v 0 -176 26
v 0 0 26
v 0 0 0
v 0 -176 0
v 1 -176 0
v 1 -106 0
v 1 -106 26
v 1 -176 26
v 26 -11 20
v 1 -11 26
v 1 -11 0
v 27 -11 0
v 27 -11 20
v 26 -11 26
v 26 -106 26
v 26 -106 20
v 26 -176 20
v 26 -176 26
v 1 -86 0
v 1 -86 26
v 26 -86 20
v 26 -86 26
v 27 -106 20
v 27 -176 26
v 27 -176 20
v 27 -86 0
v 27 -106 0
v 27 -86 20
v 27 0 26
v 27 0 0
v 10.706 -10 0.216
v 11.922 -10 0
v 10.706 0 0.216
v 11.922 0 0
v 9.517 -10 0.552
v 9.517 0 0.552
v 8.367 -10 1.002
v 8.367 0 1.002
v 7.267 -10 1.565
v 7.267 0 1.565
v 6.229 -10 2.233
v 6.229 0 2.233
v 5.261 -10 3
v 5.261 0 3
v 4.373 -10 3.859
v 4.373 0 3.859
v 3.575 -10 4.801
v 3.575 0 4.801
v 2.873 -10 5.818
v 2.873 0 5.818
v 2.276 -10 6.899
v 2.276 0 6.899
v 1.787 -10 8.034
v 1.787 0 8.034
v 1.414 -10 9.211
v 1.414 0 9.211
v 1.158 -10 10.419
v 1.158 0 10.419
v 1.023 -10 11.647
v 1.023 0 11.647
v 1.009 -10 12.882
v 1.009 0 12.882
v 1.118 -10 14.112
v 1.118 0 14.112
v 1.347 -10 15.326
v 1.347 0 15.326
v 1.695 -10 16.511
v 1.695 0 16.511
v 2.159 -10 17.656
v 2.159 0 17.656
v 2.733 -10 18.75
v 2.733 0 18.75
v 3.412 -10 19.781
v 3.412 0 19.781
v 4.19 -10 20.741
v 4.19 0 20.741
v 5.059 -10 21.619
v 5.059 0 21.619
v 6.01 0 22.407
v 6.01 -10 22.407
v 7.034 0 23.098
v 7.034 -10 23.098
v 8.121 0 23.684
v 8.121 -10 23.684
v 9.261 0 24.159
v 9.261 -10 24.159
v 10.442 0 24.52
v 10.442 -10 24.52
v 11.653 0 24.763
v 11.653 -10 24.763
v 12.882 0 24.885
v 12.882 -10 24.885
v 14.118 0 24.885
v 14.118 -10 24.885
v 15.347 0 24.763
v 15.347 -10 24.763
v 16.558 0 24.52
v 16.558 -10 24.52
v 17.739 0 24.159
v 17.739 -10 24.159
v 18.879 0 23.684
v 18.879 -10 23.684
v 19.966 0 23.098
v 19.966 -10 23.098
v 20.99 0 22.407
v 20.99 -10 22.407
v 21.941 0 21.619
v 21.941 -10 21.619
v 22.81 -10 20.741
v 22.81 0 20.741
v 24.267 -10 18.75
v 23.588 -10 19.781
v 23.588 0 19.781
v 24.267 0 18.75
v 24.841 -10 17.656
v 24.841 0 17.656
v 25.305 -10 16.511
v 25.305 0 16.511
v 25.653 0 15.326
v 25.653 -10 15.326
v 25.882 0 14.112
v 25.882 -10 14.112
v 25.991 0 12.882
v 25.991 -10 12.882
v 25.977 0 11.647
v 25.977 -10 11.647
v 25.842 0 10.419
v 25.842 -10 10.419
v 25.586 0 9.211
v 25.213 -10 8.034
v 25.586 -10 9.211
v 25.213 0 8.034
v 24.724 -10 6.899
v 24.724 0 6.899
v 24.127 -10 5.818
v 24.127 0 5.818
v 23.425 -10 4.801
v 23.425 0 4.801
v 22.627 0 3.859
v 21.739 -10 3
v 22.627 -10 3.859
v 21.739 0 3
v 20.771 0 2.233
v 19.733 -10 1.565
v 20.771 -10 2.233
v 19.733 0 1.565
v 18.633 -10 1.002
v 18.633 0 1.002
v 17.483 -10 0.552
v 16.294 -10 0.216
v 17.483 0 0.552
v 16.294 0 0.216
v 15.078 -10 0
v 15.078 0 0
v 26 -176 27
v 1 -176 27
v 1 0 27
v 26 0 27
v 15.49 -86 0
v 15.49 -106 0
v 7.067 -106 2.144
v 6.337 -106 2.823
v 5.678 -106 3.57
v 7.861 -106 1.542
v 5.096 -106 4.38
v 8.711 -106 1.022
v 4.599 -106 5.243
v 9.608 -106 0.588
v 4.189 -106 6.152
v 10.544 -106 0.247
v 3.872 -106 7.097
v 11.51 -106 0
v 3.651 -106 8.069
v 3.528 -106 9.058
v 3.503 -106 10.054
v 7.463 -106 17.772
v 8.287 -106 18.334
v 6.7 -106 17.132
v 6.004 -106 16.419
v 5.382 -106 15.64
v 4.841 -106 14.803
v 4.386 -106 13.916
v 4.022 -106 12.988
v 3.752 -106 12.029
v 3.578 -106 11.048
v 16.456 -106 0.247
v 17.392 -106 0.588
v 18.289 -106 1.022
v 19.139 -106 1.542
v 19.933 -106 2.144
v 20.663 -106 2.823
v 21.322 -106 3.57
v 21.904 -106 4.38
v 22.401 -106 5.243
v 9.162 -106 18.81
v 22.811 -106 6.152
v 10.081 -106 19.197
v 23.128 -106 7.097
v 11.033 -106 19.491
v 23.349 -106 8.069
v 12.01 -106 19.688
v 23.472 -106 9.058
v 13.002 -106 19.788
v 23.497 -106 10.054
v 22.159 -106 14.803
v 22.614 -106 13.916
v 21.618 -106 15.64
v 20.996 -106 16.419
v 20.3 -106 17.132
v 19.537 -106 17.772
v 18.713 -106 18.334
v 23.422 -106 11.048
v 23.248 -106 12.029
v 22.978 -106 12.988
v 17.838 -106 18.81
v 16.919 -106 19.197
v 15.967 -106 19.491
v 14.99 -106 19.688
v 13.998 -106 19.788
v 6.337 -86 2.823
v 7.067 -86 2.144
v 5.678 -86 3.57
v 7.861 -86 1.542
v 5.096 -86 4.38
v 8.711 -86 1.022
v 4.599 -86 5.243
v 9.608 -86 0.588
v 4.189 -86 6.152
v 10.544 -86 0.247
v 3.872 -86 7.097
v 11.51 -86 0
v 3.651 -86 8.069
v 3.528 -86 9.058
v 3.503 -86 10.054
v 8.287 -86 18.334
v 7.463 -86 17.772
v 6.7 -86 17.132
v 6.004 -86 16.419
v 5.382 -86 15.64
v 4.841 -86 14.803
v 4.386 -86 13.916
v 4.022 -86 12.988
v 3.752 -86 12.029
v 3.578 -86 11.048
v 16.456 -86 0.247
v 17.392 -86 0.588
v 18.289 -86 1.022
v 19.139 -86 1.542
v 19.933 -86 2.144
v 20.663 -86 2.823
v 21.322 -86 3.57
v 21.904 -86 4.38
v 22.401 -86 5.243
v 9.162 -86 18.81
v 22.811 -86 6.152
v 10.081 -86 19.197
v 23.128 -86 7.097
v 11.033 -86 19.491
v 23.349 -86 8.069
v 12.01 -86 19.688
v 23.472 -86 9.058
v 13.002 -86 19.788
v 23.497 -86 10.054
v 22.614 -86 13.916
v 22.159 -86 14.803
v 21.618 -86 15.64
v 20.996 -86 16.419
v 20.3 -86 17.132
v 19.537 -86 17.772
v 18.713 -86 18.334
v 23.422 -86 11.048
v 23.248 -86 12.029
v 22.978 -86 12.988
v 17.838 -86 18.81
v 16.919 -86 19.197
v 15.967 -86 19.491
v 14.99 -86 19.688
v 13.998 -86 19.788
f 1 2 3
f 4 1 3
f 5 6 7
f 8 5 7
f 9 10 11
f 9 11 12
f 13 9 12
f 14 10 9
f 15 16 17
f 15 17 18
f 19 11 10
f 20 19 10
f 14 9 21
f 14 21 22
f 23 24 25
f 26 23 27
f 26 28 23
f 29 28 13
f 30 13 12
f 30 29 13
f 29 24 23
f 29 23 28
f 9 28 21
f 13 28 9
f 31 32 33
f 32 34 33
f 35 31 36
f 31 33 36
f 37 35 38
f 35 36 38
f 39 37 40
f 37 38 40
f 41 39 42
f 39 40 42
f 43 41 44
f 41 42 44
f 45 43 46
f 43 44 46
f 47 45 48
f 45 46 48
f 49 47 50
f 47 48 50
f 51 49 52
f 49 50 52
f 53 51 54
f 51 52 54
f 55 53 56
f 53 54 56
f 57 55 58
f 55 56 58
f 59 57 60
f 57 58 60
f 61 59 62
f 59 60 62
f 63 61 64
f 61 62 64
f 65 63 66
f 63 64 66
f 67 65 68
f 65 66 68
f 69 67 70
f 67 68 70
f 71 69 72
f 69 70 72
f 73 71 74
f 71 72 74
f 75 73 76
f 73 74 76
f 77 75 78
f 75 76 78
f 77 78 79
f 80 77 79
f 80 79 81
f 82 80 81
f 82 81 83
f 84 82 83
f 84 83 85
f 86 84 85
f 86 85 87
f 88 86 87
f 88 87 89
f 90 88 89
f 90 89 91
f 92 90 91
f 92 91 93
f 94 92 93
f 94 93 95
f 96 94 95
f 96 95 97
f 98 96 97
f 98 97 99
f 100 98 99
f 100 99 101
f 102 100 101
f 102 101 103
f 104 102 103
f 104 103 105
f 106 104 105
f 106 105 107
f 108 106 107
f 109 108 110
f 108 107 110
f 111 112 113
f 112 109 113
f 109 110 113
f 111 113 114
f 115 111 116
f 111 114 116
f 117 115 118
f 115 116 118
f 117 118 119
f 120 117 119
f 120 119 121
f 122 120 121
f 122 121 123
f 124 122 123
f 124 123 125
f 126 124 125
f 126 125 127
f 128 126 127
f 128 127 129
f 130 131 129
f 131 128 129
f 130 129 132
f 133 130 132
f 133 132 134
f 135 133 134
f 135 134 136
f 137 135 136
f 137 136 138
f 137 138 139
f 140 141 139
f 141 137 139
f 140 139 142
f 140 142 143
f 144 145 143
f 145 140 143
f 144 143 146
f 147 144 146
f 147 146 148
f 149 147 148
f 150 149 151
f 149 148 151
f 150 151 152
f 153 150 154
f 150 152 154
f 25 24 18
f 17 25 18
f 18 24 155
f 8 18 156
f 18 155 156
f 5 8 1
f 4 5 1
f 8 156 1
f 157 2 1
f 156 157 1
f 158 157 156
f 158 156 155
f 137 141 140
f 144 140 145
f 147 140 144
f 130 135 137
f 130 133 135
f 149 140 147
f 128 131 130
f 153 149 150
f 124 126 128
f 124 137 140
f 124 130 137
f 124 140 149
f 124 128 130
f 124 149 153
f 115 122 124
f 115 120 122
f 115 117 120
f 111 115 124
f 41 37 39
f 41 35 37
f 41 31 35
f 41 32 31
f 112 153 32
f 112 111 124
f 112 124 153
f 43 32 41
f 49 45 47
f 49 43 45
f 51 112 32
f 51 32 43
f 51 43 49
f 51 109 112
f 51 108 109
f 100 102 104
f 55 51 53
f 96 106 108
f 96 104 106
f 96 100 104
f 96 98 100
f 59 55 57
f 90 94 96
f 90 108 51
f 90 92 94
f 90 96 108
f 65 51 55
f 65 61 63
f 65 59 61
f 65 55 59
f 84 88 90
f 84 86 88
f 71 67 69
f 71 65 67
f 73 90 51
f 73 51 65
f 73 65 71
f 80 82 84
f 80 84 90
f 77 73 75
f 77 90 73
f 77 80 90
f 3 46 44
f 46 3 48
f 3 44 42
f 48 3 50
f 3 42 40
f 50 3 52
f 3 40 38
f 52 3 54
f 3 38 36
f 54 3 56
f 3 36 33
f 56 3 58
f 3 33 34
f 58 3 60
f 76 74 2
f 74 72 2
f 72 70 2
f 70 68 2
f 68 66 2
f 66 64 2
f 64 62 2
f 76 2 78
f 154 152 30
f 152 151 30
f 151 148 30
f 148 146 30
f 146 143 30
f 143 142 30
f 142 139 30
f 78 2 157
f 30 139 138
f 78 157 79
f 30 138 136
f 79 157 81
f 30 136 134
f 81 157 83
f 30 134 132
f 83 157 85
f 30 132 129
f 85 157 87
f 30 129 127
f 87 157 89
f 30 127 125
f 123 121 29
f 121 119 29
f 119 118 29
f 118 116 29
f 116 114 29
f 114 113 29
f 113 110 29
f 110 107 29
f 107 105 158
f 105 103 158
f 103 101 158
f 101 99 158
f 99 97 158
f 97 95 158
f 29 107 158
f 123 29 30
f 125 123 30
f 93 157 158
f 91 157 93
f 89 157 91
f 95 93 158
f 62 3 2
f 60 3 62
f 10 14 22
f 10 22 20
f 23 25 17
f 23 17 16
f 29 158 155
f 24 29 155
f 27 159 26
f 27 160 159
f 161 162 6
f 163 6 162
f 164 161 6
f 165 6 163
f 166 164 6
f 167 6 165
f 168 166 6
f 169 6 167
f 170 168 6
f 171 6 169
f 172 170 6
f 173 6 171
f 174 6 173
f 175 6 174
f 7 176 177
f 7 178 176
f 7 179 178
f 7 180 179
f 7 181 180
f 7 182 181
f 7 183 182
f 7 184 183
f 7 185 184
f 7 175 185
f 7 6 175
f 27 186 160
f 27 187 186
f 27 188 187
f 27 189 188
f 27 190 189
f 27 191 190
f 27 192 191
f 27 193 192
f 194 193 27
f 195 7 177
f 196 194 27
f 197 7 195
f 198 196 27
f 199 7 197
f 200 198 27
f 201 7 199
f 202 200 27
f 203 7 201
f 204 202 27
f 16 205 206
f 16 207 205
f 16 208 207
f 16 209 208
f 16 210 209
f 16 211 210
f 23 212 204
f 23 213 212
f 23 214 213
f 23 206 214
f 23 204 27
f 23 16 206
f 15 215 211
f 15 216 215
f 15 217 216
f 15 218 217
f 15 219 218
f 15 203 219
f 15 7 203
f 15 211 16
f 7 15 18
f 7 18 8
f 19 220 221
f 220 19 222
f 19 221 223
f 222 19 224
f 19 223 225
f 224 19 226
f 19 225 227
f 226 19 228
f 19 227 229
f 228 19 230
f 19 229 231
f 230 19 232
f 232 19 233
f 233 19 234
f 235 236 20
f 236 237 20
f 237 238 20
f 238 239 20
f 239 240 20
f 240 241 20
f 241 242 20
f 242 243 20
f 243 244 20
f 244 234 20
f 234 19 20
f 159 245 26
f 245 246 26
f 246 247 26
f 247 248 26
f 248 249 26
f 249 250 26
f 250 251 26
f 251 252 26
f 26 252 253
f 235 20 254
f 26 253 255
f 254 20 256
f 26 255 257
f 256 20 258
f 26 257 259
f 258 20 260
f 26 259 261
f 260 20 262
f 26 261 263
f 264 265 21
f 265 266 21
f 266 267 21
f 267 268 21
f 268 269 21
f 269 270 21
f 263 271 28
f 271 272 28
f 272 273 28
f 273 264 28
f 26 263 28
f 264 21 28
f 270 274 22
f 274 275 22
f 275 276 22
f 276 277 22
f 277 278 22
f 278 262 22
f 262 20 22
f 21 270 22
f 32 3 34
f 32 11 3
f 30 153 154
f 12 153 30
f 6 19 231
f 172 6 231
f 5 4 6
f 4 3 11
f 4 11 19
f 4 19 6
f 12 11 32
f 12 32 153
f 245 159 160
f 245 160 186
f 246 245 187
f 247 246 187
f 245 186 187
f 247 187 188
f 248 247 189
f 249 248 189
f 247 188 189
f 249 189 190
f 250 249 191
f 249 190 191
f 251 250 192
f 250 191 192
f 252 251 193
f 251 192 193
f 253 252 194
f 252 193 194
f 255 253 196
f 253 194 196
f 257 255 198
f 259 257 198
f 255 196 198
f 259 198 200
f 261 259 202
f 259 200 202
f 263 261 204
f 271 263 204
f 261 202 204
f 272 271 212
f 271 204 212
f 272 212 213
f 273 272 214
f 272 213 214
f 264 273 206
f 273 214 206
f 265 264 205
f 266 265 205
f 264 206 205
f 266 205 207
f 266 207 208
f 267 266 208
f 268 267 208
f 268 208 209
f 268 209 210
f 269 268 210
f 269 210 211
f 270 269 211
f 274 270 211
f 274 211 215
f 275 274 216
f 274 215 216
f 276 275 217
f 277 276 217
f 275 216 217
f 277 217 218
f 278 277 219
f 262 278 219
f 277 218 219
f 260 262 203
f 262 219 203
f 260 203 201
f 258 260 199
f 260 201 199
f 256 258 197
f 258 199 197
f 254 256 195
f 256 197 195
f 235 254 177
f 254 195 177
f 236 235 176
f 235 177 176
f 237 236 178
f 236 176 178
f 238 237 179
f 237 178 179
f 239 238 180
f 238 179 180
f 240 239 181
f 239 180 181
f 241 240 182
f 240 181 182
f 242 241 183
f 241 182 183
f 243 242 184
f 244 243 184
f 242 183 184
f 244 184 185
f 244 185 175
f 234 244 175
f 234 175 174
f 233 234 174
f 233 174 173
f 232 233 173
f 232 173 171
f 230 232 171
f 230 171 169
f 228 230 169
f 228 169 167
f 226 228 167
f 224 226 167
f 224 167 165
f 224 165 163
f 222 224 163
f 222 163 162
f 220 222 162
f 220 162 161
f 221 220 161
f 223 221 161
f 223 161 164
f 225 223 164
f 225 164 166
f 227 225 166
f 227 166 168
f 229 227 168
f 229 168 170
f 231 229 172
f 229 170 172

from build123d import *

# Parameters (mm, degrees)
F1_DEPTH  = 176
F3_W      = 25
F3_H      = 1
F4_DEPTH  = 26
F5_DEPTH  = 10
F6_R      = 12.5
F7_DEPTH  = 10
F8_W      = 75
F8_H      = 20
F8_W_2    = 70
F9_DEPTH  = 1
F10_W     = 25
F10_H     = 20
F11_DEPTH = 26
F12_R     = 10
F13_DEPTH = 20
F14_SIZE  = 1


with BuildPart() as f1:
    # F0 (on Front) → F1 (new body)
    with BuildSketch(Plane.XZ):
        Polygon((0, 27), (0, 0), (1, 0), (1, 26), (13.5, 26), (13.5, 27), align=None)
    extrude(amount=F1_DEPTH)

    # F2: F1 across face


with BuildPart() as f1_1:
    add(f1.part)
    add(f1.part.mirror(Plane(origin=(13.5, -88, 26.5), x_dir=(0, 1, 0), z_dir=(1, 0, 0))))

    # F3 (on face) → F4 (join)
    with BuildSketch(Plane(origin=(0, 0, 26), x_dir=(1, 0, 0), z_dir=(0, 0, -1))):
        with Locations((13.5, 10.5)):
            Rectangle(F3_W, F3_H)
    extrude(amount=F4_DEPTH)

    # F5 (add, through all): a face of the model
    f5_faces = [f1_1.faces().sort_by_distance(p)[0] for p in [
        (13.5, -10, 13),
    ]]
    extrude(f5_faces, amount=F5_DEPTH)

    # F6 (on face) → F7 (cut)
    with BuildSketch(Plane(origin=(0, 0, 0), x_dir=(-1, 0, 0), z_dir=(0, 1, 0))):
        with Locations((-13.5, 12.4)):
            Circle(F6_R)
    extrude(amount=-F7_DEPTH, mode=Mode.SUBTRACT)

    # F8 (on face) → F9 (cut, through all)
    with BuildSketch(Plane.YZ.offset(27)):
        with Locations((-48.5, 10)):
            Rectangle(F8_W, F8_H)
        with Locations((-141, 10)):
            Rectangle(F8_W_2, F8_H)
    extrude(amount=-F9_DEPTH, mode=Mode.SUBTRACT)

    # F10 (on face) → F11 (join, through all)
    with BuildSketch(Plane(origin=(0, 0, 26), x_dir=(1, 0, 0), z_dir=(0, 0, -1))):
        with Locations((13.5, 96)):
            Rectangle(F10_W, F10_H)
    extrude(amount=F11_DEPTH)

    # F12 (on face) → F13 (cut, through all)
    with BuildSketch(Plane.XZ.offset(106)):
        with Locations((13.5, 9.8)):
            Circle(F12_R)
    extrude(amount=-F13_DEPTH, mode=Mode.SUBTRACT)

    # F14
    f14_edges = [f1_1.edges().sort_by_distance(p)[0] for p in [
        (27, -88, 27),
        (0, -88, 27),
    ]]
    chamfer(f14_edges, length=F14_SIZE)


solid = f1_1.part
